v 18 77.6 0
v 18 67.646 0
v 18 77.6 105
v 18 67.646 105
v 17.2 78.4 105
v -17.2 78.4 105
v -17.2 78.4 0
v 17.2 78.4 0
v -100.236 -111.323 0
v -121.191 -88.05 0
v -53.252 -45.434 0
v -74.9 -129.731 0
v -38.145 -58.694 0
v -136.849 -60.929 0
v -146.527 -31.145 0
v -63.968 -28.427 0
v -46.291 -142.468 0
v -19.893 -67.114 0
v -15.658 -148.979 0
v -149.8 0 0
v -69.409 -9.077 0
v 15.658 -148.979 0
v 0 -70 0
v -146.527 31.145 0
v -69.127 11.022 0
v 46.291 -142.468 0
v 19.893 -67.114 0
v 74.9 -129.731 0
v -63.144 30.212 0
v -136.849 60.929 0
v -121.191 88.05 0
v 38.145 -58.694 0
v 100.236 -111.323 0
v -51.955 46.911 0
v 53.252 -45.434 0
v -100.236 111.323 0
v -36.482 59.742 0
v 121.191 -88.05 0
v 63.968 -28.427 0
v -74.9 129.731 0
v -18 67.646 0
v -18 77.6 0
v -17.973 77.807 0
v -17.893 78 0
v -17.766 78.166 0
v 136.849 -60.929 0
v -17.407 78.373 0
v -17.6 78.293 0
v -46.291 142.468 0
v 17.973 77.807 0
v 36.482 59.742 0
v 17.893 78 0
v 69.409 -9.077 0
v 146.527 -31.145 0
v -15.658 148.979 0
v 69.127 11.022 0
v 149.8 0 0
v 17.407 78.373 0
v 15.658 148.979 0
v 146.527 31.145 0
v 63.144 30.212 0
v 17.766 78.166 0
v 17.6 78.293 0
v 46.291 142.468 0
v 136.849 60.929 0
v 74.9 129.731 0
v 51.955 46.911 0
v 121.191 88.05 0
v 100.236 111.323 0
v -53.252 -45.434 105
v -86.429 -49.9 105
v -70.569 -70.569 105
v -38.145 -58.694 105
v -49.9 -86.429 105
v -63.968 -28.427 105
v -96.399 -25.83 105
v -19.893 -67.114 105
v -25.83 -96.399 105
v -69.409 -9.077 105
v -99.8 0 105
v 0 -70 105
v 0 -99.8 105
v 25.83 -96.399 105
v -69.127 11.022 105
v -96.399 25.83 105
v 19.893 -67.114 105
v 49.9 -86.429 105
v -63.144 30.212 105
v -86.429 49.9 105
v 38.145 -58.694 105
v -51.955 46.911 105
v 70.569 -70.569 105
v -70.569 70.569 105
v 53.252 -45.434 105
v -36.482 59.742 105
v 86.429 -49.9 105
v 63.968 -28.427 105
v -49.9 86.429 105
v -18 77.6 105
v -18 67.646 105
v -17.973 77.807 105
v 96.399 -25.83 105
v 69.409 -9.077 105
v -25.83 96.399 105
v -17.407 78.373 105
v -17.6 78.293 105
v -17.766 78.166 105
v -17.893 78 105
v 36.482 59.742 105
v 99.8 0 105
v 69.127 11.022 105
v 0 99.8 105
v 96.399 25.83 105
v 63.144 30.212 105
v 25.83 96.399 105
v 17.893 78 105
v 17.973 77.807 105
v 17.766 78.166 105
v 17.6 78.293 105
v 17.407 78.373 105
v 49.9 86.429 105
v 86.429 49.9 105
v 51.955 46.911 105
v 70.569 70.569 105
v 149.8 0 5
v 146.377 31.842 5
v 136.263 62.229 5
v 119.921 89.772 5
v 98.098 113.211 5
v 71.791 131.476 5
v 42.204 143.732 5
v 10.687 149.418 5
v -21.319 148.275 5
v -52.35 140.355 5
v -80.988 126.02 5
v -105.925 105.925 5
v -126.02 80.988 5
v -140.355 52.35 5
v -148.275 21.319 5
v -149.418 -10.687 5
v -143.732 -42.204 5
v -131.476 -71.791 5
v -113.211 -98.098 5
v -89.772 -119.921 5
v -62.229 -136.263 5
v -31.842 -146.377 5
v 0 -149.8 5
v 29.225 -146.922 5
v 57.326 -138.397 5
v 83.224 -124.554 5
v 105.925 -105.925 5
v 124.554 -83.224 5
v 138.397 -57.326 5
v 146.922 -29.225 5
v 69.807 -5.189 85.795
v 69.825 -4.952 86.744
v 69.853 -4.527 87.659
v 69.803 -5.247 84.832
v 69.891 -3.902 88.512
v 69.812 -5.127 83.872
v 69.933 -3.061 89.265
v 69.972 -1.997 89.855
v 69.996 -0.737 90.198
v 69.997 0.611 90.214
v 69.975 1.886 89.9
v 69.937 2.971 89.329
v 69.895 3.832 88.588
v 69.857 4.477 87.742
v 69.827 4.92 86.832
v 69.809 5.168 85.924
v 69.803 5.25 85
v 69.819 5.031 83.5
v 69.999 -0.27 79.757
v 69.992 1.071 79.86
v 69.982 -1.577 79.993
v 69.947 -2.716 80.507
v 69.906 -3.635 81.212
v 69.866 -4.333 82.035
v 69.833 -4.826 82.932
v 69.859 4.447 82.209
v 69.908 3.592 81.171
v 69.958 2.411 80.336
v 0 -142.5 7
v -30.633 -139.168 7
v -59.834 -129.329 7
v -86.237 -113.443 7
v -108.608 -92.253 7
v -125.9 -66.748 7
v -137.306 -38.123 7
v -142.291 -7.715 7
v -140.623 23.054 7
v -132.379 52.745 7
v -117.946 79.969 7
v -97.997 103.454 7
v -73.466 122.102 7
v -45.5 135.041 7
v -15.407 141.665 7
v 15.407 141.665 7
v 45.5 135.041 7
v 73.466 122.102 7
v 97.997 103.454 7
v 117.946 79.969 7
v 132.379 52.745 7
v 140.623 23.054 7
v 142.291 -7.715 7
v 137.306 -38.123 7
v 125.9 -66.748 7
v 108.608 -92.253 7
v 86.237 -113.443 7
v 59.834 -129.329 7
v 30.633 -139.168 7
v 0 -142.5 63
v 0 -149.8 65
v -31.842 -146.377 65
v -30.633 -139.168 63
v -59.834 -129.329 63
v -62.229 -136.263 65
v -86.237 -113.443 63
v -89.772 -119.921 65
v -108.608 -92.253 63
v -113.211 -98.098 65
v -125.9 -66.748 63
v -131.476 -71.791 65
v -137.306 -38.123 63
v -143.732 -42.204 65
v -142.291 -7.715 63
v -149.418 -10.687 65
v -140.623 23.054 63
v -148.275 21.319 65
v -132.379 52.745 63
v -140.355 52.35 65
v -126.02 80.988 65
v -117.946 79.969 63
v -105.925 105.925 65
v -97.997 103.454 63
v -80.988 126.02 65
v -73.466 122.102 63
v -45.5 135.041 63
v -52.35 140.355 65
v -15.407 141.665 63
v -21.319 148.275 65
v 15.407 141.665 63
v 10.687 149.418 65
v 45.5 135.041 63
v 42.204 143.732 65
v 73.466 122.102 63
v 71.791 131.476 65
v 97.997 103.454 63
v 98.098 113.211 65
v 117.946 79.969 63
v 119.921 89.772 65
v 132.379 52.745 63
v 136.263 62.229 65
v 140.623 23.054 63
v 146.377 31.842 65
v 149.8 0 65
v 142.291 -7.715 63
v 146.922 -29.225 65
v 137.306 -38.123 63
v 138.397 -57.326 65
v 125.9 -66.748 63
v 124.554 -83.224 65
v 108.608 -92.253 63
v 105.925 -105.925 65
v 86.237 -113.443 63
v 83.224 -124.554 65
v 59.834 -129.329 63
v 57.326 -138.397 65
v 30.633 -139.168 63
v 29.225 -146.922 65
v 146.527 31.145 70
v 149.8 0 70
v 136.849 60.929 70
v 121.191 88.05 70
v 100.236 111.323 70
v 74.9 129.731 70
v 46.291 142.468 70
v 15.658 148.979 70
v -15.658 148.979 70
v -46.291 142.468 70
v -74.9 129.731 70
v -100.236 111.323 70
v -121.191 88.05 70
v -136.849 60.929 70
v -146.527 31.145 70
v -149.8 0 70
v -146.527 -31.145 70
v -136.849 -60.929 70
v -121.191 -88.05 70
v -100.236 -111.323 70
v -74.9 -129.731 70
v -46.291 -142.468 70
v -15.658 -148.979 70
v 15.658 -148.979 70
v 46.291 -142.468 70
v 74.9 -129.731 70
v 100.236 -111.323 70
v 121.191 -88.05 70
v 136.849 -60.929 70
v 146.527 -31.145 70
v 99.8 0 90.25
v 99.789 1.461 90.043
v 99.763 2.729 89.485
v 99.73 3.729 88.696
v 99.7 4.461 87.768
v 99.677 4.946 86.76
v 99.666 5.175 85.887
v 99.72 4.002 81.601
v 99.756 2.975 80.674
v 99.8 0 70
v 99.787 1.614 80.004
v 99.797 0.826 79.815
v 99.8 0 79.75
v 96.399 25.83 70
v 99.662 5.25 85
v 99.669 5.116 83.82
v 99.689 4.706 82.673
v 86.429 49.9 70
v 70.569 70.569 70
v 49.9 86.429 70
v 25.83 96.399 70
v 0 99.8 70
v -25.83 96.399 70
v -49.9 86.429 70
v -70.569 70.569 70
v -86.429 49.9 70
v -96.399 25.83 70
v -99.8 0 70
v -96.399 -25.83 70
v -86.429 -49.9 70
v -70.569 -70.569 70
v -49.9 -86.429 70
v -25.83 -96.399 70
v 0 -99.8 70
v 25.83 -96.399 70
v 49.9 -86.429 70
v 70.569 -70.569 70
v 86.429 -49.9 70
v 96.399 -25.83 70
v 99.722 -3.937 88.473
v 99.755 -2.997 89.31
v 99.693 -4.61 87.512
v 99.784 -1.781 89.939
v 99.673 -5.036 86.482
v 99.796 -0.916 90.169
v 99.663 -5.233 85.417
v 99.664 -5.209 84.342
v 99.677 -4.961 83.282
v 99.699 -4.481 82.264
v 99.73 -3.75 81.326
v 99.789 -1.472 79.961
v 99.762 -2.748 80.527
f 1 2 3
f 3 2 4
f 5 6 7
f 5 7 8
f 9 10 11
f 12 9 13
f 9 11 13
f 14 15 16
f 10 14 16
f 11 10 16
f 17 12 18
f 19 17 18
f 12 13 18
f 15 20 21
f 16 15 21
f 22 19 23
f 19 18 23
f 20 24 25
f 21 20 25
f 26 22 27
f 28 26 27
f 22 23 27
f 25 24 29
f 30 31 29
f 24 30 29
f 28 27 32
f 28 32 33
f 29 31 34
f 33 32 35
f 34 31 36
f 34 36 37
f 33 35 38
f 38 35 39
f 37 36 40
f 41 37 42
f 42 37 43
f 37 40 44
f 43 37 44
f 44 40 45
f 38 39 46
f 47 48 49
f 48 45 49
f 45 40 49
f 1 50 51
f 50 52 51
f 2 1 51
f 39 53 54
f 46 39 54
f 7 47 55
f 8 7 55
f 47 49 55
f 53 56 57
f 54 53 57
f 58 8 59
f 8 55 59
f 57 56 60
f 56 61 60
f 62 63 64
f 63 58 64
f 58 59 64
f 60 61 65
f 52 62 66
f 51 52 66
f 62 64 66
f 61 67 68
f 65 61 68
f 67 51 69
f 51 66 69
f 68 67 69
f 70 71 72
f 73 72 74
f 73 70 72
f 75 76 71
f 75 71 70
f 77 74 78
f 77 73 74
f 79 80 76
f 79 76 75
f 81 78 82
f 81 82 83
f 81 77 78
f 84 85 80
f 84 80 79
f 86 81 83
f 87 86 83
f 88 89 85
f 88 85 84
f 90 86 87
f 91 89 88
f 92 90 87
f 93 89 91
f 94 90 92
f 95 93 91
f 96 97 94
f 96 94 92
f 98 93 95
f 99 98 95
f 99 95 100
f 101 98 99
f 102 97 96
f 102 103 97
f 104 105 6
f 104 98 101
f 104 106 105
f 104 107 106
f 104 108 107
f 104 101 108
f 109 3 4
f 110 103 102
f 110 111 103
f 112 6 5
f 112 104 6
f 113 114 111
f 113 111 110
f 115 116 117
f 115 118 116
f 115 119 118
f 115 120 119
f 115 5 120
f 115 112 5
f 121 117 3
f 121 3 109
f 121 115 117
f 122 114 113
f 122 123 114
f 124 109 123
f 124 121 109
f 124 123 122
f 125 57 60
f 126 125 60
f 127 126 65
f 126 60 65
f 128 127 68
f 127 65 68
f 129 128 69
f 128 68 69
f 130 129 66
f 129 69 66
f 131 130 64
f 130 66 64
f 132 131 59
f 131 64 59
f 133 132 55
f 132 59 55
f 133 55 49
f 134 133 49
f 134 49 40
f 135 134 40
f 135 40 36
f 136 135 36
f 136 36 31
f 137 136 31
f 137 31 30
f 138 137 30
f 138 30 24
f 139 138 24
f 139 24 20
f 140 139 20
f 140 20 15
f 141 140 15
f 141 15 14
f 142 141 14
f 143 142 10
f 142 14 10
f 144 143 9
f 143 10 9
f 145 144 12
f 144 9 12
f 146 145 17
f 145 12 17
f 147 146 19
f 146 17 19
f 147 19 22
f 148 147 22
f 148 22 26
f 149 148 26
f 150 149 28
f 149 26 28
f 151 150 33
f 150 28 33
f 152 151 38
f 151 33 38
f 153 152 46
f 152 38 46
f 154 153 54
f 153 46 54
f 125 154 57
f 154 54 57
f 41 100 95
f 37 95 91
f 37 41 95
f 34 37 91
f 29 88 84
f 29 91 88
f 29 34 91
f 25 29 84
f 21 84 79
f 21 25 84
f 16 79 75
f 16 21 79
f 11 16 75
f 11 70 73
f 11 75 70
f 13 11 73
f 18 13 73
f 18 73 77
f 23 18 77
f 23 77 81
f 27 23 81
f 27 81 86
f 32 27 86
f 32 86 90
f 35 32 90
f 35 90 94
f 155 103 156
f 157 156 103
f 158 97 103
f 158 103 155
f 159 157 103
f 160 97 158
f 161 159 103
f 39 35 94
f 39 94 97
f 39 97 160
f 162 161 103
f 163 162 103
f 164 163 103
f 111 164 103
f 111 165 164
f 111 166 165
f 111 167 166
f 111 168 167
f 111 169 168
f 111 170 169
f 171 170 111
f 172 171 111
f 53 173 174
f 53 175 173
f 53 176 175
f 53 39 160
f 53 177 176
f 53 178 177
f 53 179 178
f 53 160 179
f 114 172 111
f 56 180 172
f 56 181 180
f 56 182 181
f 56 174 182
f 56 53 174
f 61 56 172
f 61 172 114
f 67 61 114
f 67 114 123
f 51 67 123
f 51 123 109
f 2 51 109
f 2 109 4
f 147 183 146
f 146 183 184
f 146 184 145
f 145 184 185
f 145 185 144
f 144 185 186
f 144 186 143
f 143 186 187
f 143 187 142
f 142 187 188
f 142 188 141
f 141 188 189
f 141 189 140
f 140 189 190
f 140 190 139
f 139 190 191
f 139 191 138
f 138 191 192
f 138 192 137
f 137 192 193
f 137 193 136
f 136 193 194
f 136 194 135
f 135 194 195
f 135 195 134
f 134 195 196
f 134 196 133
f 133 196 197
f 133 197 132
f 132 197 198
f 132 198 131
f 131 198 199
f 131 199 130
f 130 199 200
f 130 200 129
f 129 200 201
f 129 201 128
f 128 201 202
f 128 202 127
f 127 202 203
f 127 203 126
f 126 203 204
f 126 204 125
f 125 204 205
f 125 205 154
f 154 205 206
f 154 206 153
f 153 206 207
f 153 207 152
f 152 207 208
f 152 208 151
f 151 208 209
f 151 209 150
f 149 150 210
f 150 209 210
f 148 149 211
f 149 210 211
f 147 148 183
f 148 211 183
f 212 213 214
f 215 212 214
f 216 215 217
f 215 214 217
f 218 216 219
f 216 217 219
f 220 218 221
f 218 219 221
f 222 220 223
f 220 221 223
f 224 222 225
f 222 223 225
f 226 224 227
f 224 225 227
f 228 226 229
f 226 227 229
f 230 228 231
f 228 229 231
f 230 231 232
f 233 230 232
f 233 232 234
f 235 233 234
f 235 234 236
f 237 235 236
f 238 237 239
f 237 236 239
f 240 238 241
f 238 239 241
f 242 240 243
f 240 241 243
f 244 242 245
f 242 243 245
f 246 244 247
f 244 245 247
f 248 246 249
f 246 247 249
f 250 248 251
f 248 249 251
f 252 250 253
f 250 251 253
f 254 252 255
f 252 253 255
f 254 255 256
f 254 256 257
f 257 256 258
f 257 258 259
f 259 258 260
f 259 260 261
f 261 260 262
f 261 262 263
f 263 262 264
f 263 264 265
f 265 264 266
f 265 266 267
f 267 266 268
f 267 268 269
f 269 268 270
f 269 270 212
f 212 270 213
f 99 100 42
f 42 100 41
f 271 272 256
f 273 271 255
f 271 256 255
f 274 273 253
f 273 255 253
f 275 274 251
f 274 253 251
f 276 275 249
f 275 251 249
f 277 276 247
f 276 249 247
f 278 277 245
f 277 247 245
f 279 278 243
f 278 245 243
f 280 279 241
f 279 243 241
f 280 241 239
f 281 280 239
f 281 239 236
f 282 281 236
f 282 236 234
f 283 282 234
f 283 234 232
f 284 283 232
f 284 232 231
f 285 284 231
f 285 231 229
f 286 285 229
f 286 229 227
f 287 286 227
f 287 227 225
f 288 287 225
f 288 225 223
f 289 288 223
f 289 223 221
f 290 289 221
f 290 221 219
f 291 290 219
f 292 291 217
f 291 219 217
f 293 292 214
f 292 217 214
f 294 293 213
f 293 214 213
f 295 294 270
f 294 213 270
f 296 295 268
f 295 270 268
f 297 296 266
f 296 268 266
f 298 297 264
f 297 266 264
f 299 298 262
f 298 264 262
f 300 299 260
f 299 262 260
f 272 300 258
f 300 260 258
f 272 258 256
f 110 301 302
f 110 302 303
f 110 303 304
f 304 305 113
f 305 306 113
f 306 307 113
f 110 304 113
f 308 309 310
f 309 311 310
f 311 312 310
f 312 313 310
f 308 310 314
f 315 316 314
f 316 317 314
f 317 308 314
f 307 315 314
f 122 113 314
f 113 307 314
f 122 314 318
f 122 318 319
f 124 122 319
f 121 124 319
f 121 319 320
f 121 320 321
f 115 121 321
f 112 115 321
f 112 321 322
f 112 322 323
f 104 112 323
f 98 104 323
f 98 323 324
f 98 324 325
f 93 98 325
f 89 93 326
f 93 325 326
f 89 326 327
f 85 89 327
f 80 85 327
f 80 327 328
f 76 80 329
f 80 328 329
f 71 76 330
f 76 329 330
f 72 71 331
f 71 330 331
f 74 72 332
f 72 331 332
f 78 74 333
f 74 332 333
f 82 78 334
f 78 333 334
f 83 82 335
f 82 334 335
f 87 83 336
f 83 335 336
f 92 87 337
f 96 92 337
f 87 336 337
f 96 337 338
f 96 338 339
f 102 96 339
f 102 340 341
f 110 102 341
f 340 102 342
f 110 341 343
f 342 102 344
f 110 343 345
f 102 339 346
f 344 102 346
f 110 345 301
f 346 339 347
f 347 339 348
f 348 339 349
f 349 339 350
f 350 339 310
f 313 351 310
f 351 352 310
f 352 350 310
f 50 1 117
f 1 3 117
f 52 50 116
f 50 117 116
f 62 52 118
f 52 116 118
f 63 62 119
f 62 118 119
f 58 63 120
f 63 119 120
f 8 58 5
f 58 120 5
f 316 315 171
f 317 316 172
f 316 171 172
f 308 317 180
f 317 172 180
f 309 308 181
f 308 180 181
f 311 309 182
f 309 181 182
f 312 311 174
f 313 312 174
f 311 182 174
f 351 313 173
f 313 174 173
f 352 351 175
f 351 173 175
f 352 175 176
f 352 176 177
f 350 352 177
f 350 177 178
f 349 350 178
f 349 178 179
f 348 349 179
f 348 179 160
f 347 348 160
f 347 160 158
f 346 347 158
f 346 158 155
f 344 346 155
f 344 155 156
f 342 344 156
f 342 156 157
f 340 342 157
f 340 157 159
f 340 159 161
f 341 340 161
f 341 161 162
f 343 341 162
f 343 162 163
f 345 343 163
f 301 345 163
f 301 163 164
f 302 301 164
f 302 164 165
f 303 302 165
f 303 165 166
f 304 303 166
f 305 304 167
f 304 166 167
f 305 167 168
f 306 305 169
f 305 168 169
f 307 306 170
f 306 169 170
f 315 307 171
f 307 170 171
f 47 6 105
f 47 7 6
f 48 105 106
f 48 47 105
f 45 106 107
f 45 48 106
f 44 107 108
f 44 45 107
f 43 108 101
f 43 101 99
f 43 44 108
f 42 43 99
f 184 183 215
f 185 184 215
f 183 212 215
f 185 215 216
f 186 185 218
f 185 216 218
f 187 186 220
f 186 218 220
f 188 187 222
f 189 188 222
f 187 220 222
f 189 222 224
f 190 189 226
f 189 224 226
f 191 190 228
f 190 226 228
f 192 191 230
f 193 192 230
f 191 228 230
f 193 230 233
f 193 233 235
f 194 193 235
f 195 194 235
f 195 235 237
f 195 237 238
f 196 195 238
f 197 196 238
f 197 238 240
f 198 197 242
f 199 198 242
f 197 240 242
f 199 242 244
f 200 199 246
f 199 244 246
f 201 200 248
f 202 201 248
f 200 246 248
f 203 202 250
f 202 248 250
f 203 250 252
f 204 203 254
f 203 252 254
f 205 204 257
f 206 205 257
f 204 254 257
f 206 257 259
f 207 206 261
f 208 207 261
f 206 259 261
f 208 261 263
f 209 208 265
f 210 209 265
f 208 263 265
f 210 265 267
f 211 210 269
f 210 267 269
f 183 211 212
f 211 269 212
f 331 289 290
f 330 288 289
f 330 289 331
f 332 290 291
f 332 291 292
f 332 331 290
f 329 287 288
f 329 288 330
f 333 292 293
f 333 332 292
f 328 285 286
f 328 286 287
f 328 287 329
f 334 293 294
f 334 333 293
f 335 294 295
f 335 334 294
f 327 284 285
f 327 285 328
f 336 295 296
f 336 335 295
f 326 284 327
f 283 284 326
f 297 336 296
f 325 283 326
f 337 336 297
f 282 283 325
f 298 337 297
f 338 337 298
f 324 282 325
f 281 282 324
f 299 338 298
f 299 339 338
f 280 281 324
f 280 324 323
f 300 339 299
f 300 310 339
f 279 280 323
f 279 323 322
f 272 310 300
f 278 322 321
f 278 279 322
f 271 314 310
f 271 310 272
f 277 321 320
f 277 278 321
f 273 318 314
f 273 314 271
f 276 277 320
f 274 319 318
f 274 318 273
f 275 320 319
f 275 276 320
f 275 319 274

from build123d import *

# Parameters (mm, degrees)
F0_R     = 149.8
F0_R_2   = 99.8
F1_DEPTH = 70
F0_R_3   = 70
F2_DEPTH = 105
F6_DEPTH = 78.4
F8_D     = 10.5
F8_DEPTH = 149.801
F9_R     = 0.8


with BuildPart() as f1:
    # F0 (on Top) → F1 (new body)
    with BuildSketch(Plane.XY):
        Circle(F0_R)
        Circle(F0_R_2, mode=Mode.SUBTRACT)
    extrude(amount=F1_DEPTH)

    # F0 (on Top) → F2 (join)
    with BuildSketch(Plane.XY):
        Circle(F0_R_2)
        Circle(F0_R_3, mode=Mode.SUBTRACT)
    extrude(amount=F2_DEPTH)

    # F4: sweep along a path in F4_path
    with BuildLine(Plane(origin=(149.8, 0, 70), x_dir=(0, -1, 0), z_dir=(0, 0, -1))) as f4_path:
        CenterArc((0, 149.8), 149.8, 0, 360)
    # F3 (on Right) → F4 (sweep, cut)
    with BuildSketch(Plane.YZ):
        Polygon((-142.5000025749, 7.0000045449), (-149.8000025749, 7.0000045449), (-149.8000025749, 5.0000045449), align=None)
        Polygon((-142.5000025749, 63.0000045449), (-149.8000025749, 65.0000045449), (-149.8000025749, 7.0000045449), (-142.5000025749, 7.0000045449), align=None)
    sweep(path=f4_path.line, mode=Mode.SUBTRACT)

    # F5 (on Front) → F6 (cut)
    with BuildSketch(Plane.XZ):
        Polygon((-18, -125), (0, 0), (-18, 125), align=None)
        Polygon((0, -125), (18, -125), (0, 0), (-18, -125), align=None)
        Polygon((0, 0), (18, -125), (18, 125), align=None)
        Polygon((0, 0), (18, 125), (-18, 125), align=None)
    extrude(amount=-F6_DEPTH, mode=Mode.SUBTRACT)

    # F8 (through all, one way)
    with BuildSketch(Plane(origin=(0, 0, 0), x_dir=(0, 1, 0), z_dir=(-1, 0, 0))):
        with Locations((0, -85)):
            Circle(F8_D / 2)
    extrude(amount=-F8_DEPTH, mode=Mode.SUBTRACT)

    # F9
    f9_edges = [f1.edges().sort_by_distance(p)[0] for p in [
        (18, 78.4, 52.5),
        (-18, 78.4, 52.5),
    ]]
    fillet(f9_edges, radius=F9_R)


solid = f1.part
